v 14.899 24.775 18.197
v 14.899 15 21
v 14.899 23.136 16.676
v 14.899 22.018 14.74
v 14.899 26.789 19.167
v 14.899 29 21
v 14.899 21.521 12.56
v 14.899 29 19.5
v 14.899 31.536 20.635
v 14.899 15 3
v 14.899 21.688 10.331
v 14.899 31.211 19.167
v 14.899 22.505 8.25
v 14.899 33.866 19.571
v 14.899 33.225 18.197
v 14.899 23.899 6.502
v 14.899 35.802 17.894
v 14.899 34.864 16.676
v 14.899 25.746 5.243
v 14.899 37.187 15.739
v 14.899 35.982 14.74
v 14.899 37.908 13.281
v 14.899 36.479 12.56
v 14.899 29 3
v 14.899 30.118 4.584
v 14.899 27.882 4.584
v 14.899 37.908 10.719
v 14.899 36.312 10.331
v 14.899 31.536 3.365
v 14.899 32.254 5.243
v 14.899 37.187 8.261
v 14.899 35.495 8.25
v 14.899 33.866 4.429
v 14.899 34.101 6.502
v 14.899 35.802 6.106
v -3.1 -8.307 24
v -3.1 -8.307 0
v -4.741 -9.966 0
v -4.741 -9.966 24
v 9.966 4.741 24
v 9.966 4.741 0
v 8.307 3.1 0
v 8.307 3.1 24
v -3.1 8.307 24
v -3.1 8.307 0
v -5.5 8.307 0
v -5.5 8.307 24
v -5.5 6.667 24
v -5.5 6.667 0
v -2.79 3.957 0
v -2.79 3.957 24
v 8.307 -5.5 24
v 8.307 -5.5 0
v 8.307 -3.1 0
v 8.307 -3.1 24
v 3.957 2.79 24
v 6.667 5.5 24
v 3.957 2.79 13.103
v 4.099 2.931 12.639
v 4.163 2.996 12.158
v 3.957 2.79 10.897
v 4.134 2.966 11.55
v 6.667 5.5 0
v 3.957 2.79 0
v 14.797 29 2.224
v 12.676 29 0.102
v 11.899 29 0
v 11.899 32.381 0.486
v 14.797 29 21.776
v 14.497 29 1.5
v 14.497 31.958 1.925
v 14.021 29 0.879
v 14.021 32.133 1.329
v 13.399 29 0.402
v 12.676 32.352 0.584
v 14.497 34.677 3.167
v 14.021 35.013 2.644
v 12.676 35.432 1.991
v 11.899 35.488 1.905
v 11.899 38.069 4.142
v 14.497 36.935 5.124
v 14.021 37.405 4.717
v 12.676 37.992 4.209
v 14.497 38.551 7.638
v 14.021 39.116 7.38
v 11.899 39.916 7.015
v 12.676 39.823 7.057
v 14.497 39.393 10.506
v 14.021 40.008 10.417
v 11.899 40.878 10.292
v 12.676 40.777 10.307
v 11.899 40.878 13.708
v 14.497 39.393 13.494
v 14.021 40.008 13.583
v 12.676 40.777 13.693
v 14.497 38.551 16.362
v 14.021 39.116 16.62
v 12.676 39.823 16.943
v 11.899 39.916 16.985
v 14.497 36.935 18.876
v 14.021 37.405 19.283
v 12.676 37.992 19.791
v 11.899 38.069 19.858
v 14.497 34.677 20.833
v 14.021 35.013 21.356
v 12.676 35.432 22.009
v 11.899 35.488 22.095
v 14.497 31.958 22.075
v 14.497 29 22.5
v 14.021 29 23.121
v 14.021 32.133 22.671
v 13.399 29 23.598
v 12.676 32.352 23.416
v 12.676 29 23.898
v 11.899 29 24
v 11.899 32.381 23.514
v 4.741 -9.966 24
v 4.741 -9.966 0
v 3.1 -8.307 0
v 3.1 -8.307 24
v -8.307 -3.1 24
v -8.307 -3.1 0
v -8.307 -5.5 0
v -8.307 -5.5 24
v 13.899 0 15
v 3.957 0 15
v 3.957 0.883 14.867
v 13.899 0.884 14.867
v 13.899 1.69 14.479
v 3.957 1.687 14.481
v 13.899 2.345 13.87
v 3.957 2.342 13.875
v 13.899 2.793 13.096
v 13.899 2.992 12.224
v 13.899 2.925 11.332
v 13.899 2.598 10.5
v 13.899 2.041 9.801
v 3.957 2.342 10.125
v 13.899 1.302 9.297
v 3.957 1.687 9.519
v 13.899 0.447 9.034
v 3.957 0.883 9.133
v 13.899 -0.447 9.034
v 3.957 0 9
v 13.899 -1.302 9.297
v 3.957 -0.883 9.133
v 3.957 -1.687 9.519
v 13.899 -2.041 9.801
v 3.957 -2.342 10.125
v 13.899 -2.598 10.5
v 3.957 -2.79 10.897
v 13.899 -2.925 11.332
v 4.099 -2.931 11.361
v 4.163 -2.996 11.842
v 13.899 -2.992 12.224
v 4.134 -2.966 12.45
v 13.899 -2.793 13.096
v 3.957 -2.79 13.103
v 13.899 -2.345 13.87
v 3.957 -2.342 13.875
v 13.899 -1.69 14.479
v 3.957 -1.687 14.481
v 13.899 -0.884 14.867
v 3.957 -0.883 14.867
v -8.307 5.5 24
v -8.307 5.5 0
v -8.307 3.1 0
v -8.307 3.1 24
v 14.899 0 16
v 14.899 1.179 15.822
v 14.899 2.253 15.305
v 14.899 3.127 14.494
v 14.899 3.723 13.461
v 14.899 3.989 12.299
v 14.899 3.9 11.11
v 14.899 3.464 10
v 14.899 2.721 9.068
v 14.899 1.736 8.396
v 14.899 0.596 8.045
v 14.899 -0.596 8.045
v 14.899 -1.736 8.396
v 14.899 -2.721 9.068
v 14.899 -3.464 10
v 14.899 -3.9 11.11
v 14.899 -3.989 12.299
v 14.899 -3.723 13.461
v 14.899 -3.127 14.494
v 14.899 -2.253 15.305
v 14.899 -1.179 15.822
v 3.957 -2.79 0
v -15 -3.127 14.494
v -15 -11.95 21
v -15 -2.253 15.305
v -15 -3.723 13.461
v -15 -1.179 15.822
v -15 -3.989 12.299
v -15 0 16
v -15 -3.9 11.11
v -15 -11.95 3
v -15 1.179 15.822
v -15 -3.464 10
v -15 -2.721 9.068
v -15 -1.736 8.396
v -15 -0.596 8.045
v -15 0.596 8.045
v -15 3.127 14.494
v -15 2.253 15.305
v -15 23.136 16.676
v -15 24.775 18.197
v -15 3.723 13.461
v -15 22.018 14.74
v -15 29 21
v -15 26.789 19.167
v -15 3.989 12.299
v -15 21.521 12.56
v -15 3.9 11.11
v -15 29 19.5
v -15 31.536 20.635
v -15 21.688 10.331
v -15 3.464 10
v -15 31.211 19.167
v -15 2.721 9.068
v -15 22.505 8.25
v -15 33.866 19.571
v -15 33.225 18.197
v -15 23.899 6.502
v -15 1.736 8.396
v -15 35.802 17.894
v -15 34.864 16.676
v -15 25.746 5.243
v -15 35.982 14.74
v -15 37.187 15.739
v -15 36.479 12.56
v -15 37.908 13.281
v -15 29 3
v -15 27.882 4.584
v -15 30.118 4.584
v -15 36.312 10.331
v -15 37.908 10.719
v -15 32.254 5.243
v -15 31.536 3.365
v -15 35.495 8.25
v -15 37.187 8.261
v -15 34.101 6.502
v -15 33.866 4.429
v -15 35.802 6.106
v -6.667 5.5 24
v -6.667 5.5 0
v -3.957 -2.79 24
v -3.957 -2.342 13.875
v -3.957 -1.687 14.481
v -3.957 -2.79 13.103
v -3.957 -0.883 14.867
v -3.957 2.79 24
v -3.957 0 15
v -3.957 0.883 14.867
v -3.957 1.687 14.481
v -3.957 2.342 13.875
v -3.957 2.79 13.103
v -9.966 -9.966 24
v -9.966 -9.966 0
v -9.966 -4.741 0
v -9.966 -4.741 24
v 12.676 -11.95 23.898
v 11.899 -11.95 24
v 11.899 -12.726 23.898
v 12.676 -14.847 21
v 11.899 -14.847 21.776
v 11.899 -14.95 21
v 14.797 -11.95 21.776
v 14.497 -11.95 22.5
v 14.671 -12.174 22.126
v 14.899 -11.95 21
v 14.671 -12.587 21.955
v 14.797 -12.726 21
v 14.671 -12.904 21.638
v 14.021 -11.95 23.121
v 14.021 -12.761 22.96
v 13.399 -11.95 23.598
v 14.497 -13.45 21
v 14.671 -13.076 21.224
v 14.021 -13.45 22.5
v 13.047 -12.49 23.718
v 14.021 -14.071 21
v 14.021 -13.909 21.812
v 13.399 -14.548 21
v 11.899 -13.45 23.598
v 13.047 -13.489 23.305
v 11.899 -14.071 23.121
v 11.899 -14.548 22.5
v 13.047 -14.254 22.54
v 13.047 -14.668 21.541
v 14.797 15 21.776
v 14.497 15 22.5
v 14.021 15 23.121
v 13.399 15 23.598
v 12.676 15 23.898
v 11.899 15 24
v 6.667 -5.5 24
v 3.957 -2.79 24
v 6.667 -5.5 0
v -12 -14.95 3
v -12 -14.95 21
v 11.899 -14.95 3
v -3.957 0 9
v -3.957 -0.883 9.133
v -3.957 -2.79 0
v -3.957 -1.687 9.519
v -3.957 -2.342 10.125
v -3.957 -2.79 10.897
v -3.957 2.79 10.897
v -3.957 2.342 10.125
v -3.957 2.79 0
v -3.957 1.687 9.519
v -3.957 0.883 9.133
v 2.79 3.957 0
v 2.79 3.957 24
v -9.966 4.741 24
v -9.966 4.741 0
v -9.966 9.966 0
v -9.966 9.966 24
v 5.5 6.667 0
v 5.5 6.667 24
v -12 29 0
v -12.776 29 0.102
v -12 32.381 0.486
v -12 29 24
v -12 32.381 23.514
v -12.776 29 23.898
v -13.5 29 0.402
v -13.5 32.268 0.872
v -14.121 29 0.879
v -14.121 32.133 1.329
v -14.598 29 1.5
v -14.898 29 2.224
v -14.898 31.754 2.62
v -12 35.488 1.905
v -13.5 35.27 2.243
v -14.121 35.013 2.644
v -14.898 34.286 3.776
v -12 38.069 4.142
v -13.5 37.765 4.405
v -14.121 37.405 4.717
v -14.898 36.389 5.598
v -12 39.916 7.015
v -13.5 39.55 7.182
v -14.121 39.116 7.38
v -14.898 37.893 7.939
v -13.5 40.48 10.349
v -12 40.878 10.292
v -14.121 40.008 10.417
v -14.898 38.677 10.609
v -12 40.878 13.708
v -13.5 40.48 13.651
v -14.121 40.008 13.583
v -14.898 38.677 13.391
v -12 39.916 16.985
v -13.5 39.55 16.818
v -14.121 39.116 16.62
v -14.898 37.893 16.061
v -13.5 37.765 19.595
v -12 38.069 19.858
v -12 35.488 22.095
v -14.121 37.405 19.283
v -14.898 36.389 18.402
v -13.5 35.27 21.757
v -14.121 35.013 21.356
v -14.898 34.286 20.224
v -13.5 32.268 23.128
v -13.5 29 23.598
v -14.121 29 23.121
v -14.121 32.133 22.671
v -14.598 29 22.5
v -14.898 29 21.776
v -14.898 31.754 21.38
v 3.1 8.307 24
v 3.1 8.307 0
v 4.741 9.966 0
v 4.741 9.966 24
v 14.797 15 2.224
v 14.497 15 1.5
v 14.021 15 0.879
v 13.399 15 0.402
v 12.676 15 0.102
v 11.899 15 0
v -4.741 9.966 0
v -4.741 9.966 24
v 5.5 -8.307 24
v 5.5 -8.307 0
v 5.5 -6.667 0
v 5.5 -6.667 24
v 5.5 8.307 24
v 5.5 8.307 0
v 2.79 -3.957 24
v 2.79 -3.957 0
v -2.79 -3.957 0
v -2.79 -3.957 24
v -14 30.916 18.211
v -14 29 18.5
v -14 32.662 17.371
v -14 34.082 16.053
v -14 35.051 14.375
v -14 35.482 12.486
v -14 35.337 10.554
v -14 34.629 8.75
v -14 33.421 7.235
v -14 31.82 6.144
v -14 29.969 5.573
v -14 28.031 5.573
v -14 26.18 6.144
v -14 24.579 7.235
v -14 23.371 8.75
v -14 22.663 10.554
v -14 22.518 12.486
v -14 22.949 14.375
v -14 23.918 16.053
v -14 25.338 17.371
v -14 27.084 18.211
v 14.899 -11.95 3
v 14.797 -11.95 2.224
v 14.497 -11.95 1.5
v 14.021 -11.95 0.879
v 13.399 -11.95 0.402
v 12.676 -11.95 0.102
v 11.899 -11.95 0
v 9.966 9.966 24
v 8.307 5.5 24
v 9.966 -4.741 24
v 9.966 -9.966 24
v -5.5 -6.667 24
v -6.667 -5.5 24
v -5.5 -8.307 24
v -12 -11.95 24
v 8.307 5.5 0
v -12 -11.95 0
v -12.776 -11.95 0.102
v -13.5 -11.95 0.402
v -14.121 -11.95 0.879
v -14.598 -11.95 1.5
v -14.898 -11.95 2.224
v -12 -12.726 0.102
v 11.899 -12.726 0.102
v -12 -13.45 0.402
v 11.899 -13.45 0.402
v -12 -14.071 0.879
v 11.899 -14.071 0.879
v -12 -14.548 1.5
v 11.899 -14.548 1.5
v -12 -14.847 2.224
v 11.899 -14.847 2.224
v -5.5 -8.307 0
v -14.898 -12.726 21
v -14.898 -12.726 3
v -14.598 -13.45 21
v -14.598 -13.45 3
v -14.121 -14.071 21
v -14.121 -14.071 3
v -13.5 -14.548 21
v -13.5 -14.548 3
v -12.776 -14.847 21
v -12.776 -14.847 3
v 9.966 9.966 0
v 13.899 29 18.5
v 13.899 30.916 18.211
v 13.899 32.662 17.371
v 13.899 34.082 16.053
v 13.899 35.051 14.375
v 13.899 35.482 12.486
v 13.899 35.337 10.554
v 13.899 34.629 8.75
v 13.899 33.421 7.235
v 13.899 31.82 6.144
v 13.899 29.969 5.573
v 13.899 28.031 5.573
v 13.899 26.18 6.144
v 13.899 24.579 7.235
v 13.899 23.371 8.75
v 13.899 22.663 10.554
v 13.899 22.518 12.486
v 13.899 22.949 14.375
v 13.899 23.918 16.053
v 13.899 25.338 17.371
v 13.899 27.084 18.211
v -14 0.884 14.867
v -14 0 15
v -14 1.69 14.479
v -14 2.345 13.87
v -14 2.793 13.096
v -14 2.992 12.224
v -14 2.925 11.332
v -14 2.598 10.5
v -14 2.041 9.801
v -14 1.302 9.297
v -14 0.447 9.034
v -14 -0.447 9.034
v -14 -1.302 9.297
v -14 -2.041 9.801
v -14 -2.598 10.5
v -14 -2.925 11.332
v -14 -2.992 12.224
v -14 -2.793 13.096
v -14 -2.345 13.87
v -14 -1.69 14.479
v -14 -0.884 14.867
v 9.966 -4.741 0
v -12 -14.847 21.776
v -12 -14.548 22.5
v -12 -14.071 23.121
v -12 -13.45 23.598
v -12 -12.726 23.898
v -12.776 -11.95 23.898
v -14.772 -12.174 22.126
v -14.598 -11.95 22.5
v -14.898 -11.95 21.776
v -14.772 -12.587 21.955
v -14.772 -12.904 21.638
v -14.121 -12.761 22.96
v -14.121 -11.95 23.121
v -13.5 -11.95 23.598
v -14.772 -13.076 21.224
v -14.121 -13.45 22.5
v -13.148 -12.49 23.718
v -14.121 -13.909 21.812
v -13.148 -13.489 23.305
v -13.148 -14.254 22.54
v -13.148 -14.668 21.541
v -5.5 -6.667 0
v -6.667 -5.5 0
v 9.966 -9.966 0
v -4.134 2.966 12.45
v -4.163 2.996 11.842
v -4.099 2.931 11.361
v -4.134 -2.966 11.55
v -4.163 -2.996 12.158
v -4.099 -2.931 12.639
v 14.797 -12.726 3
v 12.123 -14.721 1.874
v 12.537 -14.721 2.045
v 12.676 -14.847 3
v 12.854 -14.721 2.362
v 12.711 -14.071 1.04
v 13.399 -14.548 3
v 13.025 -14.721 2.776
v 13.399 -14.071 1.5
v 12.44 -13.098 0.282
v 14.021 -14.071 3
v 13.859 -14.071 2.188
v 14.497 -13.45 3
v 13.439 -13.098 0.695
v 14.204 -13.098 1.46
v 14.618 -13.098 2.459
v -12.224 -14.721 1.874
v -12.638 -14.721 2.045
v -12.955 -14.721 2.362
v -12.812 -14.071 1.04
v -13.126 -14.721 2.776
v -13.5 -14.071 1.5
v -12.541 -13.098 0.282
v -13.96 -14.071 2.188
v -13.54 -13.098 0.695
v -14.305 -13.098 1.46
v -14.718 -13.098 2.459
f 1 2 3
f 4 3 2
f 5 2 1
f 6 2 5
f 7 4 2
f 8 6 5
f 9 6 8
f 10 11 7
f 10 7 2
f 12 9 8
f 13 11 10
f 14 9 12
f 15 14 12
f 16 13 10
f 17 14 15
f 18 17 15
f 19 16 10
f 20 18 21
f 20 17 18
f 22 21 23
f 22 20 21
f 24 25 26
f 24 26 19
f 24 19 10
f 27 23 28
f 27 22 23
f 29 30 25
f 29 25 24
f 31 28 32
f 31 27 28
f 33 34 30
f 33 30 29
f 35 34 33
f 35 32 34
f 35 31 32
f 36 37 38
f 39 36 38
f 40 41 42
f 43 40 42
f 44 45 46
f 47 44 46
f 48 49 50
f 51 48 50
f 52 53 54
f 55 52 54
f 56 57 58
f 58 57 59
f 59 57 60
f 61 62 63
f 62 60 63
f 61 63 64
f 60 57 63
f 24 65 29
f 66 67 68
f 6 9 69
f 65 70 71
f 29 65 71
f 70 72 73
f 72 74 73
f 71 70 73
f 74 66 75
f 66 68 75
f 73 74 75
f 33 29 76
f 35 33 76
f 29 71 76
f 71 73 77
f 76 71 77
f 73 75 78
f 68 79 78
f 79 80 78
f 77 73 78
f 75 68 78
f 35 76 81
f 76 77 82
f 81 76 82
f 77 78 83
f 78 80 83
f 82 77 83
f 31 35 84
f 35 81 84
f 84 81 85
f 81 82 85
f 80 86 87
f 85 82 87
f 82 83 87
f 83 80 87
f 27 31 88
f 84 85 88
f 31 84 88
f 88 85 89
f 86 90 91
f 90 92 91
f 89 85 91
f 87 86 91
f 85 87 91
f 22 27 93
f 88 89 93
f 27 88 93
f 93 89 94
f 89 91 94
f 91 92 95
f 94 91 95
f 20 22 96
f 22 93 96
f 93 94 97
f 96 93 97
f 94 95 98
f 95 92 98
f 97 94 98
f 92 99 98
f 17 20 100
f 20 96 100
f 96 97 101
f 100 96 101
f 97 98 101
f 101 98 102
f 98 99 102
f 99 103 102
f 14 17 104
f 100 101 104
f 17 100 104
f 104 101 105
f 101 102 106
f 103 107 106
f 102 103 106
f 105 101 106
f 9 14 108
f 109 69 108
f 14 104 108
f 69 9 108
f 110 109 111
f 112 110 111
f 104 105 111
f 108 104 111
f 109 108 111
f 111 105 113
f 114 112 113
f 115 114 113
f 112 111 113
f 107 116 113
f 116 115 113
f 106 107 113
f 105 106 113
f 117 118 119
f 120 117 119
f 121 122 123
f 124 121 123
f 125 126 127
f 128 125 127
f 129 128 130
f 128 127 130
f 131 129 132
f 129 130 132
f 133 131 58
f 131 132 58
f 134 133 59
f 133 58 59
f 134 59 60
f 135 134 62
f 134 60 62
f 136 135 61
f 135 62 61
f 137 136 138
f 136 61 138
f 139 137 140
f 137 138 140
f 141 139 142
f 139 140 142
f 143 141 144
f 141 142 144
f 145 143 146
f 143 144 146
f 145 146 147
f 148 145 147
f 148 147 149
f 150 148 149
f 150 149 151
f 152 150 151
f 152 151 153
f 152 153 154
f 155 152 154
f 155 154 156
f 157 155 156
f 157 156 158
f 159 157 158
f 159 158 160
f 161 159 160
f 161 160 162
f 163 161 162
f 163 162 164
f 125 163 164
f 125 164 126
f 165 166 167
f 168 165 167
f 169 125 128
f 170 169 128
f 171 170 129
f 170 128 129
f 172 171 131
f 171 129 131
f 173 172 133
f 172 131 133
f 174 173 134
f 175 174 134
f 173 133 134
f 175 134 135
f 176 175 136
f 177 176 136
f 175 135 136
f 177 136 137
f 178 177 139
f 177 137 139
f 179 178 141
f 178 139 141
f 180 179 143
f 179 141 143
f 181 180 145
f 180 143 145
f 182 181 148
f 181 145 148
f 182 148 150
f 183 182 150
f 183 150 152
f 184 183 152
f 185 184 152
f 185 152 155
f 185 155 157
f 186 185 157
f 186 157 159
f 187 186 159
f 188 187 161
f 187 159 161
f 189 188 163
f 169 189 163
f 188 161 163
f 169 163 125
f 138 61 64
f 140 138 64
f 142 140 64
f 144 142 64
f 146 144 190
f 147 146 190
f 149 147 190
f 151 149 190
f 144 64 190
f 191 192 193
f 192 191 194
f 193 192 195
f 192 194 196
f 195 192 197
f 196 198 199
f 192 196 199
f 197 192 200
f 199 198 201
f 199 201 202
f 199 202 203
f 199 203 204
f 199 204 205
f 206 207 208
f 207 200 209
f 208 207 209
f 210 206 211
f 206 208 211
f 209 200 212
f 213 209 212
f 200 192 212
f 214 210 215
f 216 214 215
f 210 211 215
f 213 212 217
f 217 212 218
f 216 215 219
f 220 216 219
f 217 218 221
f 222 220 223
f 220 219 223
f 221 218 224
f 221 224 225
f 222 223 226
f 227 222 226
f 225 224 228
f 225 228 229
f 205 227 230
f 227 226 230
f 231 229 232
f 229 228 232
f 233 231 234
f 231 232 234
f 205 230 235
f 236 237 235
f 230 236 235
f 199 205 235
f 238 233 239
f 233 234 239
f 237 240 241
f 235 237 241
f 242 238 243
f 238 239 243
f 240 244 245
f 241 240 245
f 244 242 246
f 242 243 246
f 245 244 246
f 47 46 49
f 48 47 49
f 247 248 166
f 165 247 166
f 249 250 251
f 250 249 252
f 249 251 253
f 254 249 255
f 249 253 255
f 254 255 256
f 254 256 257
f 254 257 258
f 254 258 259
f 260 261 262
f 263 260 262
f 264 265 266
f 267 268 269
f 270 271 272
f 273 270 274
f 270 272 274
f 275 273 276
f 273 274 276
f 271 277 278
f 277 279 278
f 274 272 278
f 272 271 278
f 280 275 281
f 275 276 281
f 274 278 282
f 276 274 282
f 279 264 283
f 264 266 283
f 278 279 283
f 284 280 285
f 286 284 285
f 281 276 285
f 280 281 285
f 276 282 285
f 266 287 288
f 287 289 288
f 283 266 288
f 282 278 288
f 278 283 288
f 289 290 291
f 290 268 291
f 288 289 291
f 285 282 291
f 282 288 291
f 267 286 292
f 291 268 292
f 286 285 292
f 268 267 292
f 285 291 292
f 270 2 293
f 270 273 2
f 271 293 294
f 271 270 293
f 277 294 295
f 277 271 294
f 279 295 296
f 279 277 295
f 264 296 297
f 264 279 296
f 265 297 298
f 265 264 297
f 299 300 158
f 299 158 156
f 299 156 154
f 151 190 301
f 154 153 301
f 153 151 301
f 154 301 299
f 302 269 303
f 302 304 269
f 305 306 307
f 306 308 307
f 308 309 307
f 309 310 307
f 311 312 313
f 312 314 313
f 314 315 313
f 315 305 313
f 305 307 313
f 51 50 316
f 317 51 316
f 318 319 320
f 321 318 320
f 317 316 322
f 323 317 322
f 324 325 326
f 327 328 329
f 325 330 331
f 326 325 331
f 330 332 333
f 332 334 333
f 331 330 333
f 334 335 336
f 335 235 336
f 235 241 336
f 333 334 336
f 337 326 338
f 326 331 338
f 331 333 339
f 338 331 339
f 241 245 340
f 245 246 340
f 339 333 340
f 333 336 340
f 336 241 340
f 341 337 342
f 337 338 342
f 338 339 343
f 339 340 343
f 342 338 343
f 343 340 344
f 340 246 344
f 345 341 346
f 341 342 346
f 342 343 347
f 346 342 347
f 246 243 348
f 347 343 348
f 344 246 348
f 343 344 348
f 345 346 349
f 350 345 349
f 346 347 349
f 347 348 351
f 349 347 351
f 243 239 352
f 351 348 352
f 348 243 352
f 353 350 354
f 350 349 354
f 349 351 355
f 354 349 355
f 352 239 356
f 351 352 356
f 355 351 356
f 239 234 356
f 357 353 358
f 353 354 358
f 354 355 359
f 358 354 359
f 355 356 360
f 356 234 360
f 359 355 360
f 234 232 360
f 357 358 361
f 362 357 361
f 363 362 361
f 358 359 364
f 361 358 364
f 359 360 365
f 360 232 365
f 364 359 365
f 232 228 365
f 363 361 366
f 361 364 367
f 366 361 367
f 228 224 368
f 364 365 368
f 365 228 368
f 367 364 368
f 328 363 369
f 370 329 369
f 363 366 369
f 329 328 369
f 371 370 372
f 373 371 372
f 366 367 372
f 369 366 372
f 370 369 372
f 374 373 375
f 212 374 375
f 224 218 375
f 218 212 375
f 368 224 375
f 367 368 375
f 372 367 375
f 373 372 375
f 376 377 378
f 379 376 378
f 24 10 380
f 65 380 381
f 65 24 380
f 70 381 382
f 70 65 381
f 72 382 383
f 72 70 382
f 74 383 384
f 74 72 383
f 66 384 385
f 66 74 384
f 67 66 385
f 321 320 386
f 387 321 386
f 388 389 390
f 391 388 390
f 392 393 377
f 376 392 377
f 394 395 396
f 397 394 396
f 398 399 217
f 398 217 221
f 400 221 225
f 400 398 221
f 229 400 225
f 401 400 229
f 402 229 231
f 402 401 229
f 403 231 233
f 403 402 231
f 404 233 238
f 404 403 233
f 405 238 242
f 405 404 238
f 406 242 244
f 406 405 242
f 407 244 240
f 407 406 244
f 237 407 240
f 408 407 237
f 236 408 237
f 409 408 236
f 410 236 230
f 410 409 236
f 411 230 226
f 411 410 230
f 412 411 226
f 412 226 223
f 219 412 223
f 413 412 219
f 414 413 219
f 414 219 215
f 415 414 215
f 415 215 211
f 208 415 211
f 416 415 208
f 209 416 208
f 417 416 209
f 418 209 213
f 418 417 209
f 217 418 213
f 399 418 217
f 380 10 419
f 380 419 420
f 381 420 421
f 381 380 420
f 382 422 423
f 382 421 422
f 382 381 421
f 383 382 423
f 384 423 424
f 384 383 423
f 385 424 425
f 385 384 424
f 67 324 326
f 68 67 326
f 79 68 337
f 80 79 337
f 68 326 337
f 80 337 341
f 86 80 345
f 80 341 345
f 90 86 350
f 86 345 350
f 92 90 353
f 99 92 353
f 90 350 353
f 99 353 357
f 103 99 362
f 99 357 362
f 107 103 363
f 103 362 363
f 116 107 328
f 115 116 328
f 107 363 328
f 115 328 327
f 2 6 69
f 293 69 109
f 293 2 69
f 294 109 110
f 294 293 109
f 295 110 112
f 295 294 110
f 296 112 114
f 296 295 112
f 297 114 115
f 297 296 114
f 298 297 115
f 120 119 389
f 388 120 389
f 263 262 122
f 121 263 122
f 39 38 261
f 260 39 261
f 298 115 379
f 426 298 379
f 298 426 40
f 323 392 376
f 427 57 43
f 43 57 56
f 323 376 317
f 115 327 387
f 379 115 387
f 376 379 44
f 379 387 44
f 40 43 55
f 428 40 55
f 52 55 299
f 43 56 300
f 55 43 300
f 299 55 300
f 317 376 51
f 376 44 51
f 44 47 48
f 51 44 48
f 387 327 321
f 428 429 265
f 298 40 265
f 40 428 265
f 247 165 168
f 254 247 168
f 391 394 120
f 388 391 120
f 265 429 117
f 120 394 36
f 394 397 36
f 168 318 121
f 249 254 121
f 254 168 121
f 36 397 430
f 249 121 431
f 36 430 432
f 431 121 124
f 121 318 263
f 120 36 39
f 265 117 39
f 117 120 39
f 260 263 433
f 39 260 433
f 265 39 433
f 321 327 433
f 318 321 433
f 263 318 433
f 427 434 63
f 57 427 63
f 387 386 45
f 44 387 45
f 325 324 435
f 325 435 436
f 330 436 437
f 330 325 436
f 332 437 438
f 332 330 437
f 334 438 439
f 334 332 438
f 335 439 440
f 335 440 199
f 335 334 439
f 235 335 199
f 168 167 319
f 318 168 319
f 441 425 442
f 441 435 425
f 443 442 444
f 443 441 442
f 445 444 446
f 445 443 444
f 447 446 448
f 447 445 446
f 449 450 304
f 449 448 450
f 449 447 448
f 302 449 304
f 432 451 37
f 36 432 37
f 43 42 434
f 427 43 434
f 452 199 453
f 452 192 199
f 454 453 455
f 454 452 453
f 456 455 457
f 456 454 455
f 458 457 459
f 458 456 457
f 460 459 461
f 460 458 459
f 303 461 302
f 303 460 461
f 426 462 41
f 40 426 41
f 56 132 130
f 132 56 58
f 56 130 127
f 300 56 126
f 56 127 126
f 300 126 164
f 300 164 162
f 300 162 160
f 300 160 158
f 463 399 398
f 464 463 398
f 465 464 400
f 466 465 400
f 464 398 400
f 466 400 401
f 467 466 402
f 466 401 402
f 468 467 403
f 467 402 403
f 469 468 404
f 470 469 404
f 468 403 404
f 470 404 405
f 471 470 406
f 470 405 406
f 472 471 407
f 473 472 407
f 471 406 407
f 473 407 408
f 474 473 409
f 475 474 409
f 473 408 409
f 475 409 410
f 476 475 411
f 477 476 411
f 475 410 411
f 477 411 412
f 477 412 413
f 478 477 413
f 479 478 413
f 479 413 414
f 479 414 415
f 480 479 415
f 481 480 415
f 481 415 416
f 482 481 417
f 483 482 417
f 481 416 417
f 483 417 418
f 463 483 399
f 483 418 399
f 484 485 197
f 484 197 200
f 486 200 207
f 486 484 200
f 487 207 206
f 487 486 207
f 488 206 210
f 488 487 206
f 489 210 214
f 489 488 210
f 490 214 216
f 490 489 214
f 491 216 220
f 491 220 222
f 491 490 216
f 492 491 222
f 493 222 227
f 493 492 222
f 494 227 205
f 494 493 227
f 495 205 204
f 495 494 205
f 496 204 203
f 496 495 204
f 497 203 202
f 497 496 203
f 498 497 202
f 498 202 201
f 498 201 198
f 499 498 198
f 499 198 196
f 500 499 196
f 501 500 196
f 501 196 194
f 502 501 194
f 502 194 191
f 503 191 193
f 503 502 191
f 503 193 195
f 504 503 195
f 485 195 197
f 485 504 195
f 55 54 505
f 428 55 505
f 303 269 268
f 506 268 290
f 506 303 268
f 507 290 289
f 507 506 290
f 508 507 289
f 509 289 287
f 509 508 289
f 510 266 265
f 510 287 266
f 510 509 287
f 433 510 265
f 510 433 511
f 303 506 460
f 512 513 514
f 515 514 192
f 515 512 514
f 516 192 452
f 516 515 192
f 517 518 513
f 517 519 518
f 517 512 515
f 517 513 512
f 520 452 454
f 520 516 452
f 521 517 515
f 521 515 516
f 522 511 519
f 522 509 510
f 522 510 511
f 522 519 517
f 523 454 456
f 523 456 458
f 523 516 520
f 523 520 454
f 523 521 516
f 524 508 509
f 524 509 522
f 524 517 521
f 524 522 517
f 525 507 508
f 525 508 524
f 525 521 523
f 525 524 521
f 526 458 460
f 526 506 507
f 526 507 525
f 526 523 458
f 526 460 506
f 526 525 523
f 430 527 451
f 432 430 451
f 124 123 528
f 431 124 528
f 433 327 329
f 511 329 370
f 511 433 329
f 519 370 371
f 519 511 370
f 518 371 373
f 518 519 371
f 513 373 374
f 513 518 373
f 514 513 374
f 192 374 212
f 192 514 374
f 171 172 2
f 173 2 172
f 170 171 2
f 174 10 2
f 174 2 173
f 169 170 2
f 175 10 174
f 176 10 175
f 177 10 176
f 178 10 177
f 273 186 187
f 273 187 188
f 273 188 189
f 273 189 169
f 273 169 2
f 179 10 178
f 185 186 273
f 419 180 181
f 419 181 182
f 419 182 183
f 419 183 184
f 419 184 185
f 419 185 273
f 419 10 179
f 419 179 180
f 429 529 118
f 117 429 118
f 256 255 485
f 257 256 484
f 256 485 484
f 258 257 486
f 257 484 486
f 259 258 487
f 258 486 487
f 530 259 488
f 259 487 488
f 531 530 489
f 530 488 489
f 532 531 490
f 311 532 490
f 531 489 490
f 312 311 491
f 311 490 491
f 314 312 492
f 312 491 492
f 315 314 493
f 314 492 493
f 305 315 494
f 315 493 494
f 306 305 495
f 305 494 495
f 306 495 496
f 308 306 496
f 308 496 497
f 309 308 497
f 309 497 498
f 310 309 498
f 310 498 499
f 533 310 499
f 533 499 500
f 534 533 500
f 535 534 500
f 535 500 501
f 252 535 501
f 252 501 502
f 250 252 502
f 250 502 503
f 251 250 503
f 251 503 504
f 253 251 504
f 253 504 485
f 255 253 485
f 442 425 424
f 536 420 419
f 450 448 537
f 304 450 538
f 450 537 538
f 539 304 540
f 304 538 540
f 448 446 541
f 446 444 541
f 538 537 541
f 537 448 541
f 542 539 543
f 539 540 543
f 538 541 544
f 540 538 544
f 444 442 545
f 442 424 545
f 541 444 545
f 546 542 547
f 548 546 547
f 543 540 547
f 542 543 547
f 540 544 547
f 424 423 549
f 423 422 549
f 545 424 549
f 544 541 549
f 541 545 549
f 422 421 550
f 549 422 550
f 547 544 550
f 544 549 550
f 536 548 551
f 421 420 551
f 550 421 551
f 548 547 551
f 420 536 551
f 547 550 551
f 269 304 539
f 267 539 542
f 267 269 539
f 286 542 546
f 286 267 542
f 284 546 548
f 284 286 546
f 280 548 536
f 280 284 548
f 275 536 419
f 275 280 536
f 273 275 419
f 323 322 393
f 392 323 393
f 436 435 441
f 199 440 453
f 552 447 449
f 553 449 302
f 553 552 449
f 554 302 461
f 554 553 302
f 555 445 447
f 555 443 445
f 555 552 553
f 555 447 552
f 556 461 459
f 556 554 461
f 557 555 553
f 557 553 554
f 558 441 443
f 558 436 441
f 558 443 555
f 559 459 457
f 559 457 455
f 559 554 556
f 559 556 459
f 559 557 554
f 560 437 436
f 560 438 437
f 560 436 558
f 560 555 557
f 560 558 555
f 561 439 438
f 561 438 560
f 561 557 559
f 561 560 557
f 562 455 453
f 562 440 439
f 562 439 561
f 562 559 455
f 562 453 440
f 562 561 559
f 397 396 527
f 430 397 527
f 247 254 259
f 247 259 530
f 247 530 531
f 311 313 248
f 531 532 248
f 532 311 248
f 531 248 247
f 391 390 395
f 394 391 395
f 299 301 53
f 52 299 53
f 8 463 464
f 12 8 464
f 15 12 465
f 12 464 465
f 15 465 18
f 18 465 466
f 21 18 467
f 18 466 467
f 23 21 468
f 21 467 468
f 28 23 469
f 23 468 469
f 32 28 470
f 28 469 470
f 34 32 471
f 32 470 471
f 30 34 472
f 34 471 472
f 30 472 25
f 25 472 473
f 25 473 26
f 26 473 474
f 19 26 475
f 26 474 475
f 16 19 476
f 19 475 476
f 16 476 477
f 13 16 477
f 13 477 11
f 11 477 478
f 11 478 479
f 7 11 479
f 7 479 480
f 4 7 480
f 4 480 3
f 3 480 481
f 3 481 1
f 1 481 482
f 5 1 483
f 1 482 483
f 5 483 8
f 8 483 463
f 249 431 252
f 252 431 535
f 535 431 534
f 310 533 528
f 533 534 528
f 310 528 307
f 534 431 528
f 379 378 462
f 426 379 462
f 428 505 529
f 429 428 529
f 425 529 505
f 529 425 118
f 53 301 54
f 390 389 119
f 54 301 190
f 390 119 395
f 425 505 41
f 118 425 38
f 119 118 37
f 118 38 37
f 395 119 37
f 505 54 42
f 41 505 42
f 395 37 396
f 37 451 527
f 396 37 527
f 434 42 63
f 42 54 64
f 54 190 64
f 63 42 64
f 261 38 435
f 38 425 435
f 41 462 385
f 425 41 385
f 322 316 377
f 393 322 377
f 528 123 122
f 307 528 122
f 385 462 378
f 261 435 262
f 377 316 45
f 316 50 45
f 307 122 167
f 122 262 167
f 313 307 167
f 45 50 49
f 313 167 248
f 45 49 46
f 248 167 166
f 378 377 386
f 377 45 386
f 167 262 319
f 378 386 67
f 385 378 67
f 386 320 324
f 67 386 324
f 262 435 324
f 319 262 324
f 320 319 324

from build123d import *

# Parameters (mm, degrees)
BOSS_EXTRUDE1_DEPTH = 24
SKETCH5_R           = 6.5
BOSS_EXTRUDE3_DEPTH = 29.899298
SKETCH3_R           = 3
CUT_EXTRUDE1_DEPTH  = 30.899298428
FILLET1_R           = 3
CHAMFER1_SIZE       = 1


with BuildPart() as part:
    # Sketch1 → Boss-Extrude1 (new body)
    with BuildSketch(Plane.XY):
        Polygon((0, 15), (14.899298428, 15), (14.899298428, -14.949649214), (-15, -14.949649214), (-15, 15), align=None)
        Polygon((-9.966432809, 9.966432809), (-4.741432809, 9.966432809), (-3.1, 8.307461143), (-5.5, 8.307461143), (-5.5, 6.667461143), (-2.79, 3.957461143), (2.79, 3.957461143), (5.5, 6.667461143), (5.5, 8.307461143), (3.1, 8.307461143), (4.741432809, 9.966432809), (9.966432809, 9.966432809), (9.966432809, 4.741432809), (8.307461143, 3.1), (8.307461143, 5.5), (6.667461143, 5.5), (3.957461143, 2.79), (3.957461143, -2.79), (6.667461143, -5.5), (8.307461143, -5.5), (8.307461143, -3.1), (9.966432809, -4.741432809), (9.966432809, -9.966432809), (4.741432809, -9.966432809), (3.1, -8.307461143), (5.5, -8.307461143), (5.5, -6.667461143), (2.79, -3.957461143), (-2.79, -3.957461143), (-5.5, -6.667461143), (-5.5, -8.307461143), (-3.1, -8.307461143), (-4.741432809, -9.966432809), (-9.966432809, -9.966432809), (-9.966432809, -4.741432809), (-8.307461143, -3.1), (-8.307461143, -5.5), (-6.667461143, -5.5), (-3.957461143, -2.79), (-3.957461143, 2.79), (-6.667461143, 5.5), (-8.307461143, 5.5), (-8.307461143, 3.1), (-9.966432809, 4.741432809), align=None, mode=Mode.SUBTRACT)
    extrude(amount=BOSS_EXTRUDE1_DEPTH)

    # Sketch5 → Boss-Extrude3 (add, through all)
    with BuildSketch(Plane.ZY.offset(15)):
        with BuildLine():
            Line((0, 15), (0, 22.5))
            Line((0, 22.5), (0, 29))
            ThreePointArc((0, 29), (12, 41), (24, 29))
            Line((24, 29), (24, 22.5))
            Line((24, 22.5), (24, 15))
            Line((24, 15), (0, 15))
        make_face()
        with Locations((12, 29)):
            Circle(SKETCH5_R, mode=Mode.SUBTRACT)
    extrude(amount=-BOSS_EXTRUDE3_DEPTH)

    # Sketch3 → Cut-Extrude1 (cut, through all)
    with BuildSketch(Plane.ZY.offset(15)):
        with Locations((12, 0)):
            Circle(SKETCH3_R)
    extrude(amount=-CUT_EXTRUDE1_DEPTH, mode=Mode.SUBTRACT)

    # Fillet1
    fillet1_edges = [part.edges().sort_by_distance(p)[0] for p in [
        (-0.050350786, -14.949649214, 24),
        (14.899298214, 7.025175393, 24),
        (14.899298, 41, 12),
        (-15, 41, 12),
        (14.899298428, 0.025175393, 0),
        (-0.050350786, -14.949649214, 0),
        (-15, 7.025175393, 0),
        (-15, 7.025175393, 24),
        (14.899298428, -14.949649214, 12),
        (-15, -14.949649214, 12),
    ]]
    fillet(fillet1_edges, radius=FILLET1_R)

    # Chamfer1
    chamfer1_edges = [part.edges().sort_by_distance(p)[0] for p in [
        (14.899298, 29, 5.5),
        (-15, 29, 5.5),
        (14.899298428, 0, 9),
        (-15, 0, 9),
    ]]
    chamfer(chamfer1_edges, length=CHAMFER1_SIZE)


solid = part.part
